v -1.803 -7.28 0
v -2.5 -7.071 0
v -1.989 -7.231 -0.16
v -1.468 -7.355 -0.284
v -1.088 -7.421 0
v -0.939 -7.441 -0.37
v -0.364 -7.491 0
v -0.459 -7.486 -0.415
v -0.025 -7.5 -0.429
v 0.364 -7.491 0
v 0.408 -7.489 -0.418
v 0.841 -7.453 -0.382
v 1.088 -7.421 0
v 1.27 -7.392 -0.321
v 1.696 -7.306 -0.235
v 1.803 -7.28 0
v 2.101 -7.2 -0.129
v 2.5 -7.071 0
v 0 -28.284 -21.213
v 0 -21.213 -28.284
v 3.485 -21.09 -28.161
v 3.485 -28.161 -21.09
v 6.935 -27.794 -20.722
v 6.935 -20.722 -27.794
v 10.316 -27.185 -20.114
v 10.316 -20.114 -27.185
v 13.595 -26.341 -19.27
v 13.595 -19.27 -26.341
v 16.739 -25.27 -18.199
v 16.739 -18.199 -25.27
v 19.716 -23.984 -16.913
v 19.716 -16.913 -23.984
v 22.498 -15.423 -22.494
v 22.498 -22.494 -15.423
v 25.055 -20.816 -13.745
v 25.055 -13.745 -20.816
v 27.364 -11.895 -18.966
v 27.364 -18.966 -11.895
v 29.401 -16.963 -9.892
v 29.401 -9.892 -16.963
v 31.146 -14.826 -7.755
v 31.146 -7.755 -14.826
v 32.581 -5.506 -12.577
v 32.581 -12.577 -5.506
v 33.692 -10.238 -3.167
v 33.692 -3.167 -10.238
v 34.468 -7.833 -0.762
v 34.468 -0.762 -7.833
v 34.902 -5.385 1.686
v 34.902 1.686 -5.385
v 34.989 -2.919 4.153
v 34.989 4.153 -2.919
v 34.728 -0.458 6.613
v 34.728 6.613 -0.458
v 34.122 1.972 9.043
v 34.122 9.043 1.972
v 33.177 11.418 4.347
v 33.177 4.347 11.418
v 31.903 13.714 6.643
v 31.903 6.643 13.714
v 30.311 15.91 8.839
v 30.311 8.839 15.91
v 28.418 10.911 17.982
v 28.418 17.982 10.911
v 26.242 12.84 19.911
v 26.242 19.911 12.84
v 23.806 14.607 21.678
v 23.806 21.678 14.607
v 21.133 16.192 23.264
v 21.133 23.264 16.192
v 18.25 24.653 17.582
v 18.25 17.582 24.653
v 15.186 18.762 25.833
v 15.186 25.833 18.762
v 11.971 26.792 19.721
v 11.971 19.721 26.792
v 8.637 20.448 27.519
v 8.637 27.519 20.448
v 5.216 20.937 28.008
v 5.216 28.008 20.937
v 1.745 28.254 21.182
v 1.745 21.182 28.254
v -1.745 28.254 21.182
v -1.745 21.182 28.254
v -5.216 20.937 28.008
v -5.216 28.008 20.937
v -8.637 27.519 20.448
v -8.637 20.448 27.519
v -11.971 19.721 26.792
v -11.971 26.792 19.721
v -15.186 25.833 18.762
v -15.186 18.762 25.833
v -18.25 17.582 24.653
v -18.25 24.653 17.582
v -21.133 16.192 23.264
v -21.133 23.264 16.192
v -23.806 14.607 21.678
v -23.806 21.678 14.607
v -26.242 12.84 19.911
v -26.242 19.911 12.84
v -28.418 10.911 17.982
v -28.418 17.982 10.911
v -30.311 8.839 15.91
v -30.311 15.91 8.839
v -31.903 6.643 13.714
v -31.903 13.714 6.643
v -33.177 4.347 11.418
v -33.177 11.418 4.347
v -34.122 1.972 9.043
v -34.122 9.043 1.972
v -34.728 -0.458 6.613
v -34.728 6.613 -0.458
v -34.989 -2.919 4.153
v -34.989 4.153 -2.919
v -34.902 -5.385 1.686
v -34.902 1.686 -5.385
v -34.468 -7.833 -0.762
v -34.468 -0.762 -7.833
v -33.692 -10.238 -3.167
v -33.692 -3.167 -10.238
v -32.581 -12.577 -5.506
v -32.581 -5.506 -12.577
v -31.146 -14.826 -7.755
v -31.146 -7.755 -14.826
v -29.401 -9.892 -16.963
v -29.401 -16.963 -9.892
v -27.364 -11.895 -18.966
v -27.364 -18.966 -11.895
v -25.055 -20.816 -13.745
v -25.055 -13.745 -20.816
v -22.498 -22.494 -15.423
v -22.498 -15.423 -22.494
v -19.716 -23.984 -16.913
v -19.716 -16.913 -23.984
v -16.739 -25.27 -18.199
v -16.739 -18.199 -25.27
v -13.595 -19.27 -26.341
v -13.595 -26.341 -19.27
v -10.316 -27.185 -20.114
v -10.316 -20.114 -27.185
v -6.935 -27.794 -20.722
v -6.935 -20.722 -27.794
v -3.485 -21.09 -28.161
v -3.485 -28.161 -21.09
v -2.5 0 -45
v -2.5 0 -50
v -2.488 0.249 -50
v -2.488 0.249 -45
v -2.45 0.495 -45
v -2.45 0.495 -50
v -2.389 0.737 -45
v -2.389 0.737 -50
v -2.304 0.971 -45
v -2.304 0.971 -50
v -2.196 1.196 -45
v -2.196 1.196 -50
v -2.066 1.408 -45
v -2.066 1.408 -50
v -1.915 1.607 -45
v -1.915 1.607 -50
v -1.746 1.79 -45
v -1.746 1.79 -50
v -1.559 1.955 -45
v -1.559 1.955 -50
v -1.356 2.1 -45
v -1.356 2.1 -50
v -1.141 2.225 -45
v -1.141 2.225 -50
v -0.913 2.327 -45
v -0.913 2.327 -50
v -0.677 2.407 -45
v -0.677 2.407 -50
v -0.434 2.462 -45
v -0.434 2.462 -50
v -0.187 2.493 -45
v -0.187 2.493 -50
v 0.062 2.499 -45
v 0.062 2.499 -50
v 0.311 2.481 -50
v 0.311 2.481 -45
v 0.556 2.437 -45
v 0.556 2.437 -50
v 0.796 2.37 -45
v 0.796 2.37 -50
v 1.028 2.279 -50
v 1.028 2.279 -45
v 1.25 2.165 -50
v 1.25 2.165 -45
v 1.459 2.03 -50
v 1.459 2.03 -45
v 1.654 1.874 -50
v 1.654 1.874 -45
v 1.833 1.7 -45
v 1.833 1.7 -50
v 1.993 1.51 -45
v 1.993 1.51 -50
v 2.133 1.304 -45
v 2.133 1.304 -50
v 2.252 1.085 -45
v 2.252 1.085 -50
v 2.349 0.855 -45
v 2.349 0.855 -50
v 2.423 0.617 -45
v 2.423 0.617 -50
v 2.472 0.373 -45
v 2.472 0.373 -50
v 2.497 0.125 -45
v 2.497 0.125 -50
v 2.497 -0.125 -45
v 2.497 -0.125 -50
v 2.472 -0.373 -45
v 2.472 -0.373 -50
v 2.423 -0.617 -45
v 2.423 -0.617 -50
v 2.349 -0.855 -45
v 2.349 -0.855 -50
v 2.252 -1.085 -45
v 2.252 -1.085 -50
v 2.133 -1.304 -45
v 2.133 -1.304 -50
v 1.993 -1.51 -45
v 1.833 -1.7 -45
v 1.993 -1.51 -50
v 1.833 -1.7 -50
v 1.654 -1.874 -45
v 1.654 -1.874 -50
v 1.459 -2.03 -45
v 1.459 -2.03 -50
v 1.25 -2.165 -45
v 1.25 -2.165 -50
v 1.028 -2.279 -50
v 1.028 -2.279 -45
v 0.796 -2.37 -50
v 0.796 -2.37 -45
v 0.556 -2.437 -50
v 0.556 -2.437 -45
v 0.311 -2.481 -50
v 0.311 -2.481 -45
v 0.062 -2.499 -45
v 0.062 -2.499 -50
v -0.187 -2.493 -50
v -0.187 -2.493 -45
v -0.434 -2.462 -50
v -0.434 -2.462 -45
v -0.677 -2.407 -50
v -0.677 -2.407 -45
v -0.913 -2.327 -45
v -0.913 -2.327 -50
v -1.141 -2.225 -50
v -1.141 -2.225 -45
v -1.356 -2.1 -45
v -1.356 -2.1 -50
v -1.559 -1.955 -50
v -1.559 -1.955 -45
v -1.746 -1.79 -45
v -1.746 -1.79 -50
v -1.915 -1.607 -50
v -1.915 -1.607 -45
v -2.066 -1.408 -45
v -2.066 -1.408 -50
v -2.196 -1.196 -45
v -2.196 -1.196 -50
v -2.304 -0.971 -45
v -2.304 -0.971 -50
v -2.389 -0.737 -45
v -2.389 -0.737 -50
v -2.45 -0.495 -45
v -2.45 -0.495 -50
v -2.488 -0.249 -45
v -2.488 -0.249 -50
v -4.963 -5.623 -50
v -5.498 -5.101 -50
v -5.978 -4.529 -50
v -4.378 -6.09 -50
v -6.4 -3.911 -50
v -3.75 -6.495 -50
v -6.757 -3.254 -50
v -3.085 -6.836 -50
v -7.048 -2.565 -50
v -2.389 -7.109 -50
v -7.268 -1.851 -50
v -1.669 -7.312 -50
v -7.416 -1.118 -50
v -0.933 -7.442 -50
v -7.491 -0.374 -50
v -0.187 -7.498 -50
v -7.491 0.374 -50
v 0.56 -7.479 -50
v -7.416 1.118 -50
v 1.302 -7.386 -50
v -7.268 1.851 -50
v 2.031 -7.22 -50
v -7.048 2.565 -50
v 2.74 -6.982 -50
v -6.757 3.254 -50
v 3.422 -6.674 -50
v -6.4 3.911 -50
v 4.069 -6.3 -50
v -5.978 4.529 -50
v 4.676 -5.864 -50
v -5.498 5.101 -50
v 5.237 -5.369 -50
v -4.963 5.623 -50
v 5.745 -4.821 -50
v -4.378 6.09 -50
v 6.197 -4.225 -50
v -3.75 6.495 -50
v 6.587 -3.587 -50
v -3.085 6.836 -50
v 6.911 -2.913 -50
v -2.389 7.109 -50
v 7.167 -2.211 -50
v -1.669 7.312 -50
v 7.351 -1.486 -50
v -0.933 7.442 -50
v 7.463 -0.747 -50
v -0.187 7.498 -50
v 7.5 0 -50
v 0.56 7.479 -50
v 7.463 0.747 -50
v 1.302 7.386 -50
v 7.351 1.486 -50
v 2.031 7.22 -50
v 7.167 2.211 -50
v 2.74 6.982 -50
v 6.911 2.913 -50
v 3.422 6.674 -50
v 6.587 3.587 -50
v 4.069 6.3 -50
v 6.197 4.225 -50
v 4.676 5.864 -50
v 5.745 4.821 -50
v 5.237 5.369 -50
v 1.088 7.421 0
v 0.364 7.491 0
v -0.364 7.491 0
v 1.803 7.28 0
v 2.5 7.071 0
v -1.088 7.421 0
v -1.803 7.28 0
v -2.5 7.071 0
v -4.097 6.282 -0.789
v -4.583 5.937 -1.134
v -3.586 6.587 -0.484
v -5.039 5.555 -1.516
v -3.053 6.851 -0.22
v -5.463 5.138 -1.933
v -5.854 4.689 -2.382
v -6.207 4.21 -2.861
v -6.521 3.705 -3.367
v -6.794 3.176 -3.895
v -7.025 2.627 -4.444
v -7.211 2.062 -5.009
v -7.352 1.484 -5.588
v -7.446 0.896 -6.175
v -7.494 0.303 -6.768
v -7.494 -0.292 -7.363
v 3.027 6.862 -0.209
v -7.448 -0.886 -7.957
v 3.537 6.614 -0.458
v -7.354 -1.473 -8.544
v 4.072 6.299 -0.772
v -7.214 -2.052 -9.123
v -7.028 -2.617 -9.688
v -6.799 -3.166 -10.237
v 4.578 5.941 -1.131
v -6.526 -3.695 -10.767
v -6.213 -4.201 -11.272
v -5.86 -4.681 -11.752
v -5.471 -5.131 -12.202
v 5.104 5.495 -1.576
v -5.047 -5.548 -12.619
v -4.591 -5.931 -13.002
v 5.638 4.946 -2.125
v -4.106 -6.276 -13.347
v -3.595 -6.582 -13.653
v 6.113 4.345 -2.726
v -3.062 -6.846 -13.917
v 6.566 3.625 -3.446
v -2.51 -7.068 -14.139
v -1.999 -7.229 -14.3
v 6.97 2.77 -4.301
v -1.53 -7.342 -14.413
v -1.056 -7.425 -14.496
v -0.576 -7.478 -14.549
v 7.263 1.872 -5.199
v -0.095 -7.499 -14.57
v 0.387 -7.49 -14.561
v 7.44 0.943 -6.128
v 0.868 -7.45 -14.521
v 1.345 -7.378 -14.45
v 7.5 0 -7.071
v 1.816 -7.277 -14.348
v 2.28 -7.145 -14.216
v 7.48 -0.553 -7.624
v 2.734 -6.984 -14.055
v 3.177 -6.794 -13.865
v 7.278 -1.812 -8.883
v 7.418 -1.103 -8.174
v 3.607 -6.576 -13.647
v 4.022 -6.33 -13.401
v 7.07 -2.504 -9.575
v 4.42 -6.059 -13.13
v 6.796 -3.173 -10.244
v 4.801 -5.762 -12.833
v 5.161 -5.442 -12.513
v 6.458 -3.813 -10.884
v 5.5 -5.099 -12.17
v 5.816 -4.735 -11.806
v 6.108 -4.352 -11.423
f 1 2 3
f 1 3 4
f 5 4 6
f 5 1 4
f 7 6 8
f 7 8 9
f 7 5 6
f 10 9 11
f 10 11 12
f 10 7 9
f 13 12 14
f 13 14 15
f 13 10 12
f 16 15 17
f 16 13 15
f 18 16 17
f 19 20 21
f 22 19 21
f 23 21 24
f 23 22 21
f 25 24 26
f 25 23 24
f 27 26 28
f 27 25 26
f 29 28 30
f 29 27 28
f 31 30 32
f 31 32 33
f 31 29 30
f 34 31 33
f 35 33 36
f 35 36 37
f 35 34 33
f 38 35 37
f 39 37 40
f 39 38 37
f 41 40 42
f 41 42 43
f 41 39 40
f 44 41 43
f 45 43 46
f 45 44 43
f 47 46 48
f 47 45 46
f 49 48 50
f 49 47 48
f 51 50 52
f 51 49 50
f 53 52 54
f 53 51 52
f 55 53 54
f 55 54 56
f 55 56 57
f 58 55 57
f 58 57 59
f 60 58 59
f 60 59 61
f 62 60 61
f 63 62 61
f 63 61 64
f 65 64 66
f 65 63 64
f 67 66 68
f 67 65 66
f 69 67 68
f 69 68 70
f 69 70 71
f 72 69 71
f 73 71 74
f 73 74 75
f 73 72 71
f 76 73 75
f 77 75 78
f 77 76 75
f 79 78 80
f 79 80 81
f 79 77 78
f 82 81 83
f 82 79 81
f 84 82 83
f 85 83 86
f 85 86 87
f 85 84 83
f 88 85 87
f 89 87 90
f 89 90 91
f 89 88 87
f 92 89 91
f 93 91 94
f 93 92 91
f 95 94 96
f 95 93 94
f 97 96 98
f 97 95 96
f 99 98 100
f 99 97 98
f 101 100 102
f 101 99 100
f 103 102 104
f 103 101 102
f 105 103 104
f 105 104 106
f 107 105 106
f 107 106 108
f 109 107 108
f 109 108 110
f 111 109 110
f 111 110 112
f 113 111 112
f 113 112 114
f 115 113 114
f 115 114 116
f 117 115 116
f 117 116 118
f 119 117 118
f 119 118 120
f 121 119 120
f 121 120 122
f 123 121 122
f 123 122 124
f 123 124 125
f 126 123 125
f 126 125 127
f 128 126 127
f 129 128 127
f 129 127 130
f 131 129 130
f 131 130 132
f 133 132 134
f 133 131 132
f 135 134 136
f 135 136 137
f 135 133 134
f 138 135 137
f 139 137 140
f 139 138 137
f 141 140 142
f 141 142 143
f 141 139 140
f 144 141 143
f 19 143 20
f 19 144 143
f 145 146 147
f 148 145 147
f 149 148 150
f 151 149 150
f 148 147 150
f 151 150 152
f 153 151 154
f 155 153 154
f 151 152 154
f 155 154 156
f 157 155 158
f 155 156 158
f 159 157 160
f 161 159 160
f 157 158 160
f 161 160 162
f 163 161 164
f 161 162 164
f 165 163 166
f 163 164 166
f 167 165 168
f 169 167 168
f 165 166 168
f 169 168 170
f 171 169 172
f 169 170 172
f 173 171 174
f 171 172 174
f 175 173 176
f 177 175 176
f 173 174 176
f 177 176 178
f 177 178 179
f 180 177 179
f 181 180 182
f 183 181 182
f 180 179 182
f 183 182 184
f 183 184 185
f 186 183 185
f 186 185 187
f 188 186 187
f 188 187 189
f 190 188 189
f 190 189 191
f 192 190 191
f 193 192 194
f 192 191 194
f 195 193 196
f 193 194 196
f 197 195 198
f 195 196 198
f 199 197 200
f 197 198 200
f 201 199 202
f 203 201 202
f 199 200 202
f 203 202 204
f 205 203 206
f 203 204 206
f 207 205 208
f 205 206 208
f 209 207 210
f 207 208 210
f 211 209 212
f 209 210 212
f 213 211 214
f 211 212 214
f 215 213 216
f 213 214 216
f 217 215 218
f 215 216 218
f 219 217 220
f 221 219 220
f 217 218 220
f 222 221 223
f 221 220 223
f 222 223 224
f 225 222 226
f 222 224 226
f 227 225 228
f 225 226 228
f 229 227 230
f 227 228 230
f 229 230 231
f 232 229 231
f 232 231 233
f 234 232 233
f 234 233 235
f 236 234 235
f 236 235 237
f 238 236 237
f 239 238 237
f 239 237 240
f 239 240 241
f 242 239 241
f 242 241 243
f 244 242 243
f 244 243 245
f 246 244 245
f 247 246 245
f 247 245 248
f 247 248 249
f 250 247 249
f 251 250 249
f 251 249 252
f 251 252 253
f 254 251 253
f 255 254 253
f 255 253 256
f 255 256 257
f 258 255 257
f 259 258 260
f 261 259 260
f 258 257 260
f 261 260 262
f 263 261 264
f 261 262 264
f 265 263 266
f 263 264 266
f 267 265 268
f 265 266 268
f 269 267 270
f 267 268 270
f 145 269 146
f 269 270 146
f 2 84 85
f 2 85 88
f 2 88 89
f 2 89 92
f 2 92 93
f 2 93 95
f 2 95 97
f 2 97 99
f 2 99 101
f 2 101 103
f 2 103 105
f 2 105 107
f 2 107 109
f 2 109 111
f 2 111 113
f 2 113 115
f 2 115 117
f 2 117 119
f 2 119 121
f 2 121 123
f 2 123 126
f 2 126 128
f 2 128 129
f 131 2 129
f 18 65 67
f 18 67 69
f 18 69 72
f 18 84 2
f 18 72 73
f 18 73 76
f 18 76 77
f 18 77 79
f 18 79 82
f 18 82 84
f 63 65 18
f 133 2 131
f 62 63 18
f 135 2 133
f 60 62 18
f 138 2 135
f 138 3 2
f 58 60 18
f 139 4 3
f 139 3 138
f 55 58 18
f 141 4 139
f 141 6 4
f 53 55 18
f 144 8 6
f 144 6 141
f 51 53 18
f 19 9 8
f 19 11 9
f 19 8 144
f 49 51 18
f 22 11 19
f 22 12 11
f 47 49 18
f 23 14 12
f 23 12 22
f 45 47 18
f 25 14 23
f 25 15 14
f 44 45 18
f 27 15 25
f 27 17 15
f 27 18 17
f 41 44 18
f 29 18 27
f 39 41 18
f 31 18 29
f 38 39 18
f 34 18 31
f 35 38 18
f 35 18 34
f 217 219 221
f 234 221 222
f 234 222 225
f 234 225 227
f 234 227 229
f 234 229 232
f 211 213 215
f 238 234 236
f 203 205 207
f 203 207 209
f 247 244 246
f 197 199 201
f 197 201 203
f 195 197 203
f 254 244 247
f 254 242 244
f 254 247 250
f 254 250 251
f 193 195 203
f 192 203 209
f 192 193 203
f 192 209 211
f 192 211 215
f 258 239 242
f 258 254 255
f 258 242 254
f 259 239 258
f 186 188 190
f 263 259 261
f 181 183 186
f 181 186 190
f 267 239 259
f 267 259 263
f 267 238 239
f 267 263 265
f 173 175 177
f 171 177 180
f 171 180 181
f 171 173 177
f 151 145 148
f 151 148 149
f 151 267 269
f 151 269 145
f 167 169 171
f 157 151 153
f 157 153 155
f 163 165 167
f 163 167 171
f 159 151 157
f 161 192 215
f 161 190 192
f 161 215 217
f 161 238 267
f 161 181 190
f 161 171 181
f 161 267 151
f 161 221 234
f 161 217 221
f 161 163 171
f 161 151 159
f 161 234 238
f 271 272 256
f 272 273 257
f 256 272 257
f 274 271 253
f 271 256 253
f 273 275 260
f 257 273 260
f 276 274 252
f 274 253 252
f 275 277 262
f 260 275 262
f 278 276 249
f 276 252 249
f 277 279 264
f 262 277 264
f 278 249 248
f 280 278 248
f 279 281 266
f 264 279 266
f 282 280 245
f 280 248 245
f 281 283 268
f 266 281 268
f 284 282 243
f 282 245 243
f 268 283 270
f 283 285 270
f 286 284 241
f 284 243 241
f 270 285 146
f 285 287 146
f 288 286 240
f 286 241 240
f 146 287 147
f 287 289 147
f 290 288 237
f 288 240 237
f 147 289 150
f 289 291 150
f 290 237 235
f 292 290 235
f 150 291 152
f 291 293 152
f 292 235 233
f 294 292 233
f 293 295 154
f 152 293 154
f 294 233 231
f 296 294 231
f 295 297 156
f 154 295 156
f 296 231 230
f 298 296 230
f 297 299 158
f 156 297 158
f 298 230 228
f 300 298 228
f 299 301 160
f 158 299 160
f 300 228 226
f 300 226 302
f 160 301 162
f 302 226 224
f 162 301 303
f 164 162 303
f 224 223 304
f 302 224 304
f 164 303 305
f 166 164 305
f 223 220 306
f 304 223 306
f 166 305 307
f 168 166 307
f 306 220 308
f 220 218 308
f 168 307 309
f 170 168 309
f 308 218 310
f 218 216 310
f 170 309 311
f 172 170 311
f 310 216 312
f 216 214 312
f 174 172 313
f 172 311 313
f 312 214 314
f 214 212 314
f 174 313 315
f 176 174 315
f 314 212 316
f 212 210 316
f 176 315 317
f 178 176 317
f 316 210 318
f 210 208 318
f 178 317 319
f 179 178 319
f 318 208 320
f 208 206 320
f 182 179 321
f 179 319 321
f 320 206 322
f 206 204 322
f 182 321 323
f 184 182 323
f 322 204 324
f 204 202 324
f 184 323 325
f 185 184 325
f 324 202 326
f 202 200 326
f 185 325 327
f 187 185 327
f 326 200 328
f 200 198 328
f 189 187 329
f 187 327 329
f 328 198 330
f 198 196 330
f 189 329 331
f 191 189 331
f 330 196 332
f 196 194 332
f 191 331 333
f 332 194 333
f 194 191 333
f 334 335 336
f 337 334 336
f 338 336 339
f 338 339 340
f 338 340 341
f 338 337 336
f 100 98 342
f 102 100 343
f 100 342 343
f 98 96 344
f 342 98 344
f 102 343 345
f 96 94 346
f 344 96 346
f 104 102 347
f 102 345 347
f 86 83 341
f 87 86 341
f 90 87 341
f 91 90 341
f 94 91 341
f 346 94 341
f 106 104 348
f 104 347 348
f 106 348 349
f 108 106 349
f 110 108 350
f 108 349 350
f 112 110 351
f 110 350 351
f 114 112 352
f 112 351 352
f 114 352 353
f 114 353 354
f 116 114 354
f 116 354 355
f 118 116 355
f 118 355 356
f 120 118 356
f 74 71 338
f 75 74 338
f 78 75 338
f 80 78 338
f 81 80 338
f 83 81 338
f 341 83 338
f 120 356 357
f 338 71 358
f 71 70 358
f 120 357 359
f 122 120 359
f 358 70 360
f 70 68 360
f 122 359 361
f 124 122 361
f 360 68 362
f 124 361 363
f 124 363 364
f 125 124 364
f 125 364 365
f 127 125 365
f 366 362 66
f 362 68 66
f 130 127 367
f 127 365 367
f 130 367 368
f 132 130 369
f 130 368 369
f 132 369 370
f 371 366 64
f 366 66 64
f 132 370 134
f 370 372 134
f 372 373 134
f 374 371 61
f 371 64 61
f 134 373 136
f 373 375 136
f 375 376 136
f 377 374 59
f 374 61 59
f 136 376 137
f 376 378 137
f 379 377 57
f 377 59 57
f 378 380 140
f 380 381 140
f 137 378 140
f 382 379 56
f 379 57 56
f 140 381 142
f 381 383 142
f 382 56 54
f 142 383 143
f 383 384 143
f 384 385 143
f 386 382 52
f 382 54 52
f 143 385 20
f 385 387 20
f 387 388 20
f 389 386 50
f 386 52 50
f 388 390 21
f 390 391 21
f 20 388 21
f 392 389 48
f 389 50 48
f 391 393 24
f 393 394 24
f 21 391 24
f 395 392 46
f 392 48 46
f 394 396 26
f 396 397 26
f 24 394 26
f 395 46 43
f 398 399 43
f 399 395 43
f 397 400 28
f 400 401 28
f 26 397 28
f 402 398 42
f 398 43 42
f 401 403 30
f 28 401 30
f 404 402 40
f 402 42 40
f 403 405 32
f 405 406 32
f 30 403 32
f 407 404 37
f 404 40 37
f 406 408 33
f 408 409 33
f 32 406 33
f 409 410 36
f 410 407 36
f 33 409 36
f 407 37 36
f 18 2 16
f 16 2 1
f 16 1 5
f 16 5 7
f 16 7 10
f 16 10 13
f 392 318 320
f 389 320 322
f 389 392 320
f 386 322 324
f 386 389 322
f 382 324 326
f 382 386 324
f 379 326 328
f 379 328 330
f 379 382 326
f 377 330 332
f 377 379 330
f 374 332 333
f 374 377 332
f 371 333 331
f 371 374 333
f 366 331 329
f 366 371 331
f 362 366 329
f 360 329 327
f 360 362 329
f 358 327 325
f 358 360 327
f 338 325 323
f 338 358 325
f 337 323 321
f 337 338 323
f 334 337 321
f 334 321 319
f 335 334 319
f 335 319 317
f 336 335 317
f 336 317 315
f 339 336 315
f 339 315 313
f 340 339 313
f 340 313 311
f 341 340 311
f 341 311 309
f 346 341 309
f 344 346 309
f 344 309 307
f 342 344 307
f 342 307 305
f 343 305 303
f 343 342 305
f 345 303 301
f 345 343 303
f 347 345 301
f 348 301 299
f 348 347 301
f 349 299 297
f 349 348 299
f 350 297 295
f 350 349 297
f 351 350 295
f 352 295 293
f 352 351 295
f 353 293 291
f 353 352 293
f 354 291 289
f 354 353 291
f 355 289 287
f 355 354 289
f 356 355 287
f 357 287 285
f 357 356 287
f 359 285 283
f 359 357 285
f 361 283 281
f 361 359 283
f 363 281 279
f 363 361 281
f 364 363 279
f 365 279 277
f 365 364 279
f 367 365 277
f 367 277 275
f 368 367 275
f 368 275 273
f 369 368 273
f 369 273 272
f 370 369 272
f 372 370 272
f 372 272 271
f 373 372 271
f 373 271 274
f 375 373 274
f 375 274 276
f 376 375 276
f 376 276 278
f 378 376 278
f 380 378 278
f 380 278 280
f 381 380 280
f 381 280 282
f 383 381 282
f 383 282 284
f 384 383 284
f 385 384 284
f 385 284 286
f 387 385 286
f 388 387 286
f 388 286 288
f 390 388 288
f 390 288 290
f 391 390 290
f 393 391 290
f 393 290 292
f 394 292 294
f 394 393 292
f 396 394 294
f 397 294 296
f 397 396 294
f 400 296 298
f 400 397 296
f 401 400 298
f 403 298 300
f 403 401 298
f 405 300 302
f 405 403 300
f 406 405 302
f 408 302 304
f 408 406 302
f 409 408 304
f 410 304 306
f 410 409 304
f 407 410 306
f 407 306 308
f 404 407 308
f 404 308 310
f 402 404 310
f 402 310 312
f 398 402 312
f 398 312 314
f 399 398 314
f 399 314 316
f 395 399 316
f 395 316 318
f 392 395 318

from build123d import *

# Parameters (mm, degrees)
SKETCH1_R           = 7.5
BOSS_EXTRUDE1_DEPTH = 50
SKETCH3_R           = 35
BOSS_EXTRUDE2_DEPTH = 5
SKETCH4_R           = 2.5
CUT_EXTRUDE1_DEPTH  = 5


with BuildPart() as part:
    # Sketch1 → Boss-Extrude1 (new body)
    with BuildSketch(Plane.XY):
        Circle(SKETCH1_R)
    extrude(amount=-BOSS_EXTRUDE1_DEPTH)

    # Sketch3 → Boss-Extrude2 (add, symmetric)
    with BuildSketch(Plane(origin=(0, 0, 0), x_dir=(1, 0, 0), z_dir=(0, -0.7071067811865475, 0.7071067811865477))):
        with Locations(Location((0, 0, 0), (0, 0, 270))):
            Circle(SKETCH3_R)
    extrude(amount=BOSS_EXTRUDE2_DEPTH, both=True)

    # Sketch4 → Cut-Extrude1 (cut)
    with BuildSketch(Plane(origin=(0, 0, -50), x_dir=(-1, 0, 0), z_dir=(0, 0, -1))):
        Circle(SKETCH4_R)
    extrude(amount=-CUT_EXTRUDE1_DEPTH, mode=Mode.SUBTRACT)


solid = part.part
